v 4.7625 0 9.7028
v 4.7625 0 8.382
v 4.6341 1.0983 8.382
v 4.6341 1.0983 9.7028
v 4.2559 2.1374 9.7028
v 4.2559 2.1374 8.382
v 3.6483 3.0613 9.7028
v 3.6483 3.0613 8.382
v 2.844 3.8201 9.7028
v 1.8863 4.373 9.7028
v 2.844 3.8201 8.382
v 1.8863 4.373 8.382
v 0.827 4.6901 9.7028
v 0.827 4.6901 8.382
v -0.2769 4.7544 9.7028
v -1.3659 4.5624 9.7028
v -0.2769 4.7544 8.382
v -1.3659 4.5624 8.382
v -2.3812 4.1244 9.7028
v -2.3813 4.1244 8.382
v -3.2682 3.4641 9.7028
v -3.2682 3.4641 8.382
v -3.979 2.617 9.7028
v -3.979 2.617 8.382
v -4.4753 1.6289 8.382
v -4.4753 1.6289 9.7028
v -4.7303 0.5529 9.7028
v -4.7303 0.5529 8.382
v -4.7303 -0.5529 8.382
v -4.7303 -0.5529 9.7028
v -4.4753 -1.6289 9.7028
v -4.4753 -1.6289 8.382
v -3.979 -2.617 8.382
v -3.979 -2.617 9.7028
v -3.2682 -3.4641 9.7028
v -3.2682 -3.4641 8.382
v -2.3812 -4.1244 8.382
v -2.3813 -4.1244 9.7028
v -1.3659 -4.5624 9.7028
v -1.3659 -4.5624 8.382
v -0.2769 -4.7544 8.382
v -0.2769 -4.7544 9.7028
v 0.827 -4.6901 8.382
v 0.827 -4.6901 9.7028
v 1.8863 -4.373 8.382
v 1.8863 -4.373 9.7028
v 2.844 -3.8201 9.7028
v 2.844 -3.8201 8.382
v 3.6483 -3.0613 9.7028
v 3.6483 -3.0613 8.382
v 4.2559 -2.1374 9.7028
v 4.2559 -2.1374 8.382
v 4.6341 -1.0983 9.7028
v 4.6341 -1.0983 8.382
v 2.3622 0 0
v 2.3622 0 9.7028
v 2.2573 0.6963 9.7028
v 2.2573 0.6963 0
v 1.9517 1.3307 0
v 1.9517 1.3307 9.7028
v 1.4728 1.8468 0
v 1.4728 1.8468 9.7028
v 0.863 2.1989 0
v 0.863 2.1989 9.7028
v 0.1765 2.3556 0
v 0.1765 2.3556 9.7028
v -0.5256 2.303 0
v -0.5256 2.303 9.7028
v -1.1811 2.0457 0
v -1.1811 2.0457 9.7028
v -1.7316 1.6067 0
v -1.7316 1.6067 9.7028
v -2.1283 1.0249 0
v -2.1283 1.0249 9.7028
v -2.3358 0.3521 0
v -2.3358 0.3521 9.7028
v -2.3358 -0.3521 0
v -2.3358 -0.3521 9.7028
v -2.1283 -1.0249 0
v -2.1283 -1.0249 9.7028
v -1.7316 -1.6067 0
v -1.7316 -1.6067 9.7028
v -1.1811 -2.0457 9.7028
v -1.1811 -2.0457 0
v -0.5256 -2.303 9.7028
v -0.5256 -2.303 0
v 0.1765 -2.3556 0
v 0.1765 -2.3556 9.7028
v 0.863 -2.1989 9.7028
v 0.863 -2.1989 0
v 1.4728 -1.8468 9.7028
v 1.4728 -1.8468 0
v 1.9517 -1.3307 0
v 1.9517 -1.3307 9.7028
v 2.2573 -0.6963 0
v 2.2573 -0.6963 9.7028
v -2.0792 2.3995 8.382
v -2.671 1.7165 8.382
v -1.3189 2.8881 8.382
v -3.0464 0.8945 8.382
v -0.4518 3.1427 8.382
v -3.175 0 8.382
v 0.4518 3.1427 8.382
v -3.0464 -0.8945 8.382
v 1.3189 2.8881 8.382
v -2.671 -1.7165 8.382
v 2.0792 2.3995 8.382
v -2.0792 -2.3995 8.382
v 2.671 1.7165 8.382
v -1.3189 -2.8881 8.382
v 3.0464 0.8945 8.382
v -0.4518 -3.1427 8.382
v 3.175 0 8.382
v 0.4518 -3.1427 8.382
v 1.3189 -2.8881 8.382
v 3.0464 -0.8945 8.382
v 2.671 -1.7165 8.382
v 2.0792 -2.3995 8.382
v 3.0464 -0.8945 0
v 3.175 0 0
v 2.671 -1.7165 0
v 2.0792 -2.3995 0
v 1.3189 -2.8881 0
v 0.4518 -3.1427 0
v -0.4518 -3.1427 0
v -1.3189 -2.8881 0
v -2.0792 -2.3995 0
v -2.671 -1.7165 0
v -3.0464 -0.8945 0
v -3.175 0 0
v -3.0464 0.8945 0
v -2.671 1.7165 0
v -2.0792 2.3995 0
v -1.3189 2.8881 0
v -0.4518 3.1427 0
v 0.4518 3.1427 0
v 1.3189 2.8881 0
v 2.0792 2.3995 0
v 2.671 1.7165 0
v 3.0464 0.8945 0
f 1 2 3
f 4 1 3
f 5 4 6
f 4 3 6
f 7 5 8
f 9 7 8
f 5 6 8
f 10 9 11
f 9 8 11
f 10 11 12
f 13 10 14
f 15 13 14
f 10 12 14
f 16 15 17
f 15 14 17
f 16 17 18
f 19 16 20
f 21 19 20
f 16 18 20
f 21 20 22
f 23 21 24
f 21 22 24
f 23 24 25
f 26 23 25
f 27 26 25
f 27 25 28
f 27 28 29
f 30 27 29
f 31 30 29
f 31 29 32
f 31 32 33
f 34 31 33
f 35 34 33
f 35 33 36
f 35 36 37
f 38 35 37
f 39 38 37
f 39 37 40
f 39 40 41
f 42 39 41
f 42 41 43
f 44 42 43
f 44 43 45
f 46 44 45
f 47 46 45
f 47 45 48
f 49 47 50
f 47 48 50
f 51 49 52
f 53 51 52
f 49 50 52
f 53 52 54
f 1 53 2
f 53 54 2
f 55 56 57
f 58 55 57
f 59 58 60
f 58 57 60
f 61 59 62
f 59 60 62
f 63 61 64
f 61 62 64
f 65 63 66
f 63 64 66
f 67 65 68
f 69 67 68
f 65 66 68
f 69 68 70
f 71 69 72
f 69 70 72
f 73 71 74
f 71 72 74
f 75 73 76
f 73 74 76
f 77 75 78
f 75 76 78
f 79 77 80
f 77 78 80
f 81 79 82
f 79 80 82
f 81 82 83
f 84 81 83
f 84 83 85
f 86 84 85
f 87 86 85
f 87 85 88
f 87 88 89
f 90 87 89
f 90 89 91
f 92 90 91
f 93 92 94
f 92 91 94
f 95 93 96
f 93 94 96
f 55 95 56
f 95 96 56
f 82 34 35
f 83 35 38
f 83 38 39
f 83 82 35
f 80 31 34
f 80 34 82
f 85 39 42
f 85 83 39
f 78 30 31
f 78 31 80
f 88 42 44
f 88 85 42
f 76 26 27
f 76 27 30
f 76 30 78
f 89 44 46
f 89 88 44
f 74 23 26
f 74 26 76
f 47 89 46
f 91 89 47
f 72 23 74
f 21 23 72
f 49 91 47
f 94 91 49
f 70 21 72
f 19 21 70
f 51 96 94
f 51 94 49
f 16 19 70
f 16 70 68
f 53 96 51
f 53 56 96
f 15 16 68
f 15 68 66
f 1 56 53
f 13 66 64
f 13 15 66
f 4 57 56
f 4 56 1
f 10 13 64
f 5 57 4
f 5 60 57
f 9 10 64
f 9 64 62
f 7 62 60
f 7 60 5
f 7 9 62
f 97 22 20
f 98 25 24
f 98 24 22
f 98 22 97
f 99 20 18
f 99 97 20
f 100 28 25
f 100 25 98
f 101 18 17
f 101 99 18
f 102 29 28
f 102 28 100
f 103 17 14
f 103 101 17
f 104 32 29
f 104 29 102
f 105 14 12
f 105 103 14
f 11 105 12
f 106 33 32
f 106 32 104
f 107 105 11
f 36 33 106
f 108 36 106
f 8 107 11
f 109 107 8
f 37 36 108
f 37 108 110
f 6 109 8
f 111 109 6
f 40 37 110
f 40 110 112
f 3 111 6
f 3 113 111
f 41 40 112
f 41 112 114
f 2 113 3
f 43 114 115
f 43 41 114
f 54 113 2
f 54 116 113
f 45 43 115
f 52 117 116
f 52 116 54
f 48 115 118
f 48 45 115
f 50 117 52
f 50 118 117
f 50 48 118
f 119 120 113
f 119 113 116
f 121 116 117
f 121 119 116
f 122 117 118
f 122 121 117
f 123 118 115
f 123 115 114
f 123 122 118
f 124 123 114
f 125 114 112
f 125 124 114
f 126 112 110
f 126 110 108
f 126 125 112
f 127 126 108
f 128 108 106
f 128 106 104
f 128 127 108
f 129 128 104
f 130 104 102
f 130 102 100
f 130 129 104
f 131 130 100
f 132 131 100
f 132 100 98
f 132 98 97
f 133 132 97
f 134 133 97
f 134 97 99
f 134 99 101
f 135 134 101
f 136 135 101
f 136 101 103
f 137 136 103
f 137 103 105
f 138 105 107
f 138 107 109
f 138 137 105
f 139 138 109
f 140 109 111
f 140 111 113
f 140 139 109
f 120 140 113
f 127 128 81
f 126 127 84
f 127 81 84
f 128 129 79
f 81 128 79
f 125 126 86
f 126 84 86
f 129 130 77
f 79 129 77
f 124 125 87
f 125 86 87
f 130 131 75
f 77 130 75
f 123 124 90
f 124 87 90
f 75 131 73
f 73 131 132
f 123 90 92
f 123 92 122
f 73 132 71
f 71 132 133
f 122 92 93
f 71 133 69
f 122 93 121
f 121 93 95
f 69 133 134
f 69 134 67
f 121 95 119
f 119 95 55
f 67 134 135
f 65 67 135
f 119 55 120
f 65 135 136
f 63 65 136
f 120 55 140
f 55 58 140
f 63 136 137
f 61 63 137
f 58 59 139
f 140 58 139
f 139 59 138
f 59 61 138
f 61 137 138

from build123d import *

# Parameters (mm, degrees)
F0_R     = 4.7625
F1_DEPTH = 9.7028
F2_R     = 2.3622
F3_DEPTH = 9.7028
F4_R     = 4.7625
F4_R_2   = 3.175
F5_DEPTH = 8.382


with BuildPart() as f1:
    # F0 (on Top) → F1 (new body)
    with BuildSketch(Plane.XY):
        Circle(F0_R)
    extrude(amount=F1_DEPTH)

    # F2 (on face) → F3 (cut, through all)
    with BuildSketch(Plane.XY.offset(9.7028)):
        Circle(F2_R)
    extrude(amount=-F3_DEPTH, mode=Mode.SUBTRACT)

    # F4 (on face) → F5 (cut)
    with BuildSketch(Plane(origin=(0, 0, 0), x_dir=(1, 0, 0), z_dir=(0, 0, -1))):
        Circle(F4_R)
        Circle(F4_R_2, mode=Mode.SUBTRACT)
    extrude(amount=-F5_DEPTH, mode=Mode.SUBTRACT)


solid = f1.part
